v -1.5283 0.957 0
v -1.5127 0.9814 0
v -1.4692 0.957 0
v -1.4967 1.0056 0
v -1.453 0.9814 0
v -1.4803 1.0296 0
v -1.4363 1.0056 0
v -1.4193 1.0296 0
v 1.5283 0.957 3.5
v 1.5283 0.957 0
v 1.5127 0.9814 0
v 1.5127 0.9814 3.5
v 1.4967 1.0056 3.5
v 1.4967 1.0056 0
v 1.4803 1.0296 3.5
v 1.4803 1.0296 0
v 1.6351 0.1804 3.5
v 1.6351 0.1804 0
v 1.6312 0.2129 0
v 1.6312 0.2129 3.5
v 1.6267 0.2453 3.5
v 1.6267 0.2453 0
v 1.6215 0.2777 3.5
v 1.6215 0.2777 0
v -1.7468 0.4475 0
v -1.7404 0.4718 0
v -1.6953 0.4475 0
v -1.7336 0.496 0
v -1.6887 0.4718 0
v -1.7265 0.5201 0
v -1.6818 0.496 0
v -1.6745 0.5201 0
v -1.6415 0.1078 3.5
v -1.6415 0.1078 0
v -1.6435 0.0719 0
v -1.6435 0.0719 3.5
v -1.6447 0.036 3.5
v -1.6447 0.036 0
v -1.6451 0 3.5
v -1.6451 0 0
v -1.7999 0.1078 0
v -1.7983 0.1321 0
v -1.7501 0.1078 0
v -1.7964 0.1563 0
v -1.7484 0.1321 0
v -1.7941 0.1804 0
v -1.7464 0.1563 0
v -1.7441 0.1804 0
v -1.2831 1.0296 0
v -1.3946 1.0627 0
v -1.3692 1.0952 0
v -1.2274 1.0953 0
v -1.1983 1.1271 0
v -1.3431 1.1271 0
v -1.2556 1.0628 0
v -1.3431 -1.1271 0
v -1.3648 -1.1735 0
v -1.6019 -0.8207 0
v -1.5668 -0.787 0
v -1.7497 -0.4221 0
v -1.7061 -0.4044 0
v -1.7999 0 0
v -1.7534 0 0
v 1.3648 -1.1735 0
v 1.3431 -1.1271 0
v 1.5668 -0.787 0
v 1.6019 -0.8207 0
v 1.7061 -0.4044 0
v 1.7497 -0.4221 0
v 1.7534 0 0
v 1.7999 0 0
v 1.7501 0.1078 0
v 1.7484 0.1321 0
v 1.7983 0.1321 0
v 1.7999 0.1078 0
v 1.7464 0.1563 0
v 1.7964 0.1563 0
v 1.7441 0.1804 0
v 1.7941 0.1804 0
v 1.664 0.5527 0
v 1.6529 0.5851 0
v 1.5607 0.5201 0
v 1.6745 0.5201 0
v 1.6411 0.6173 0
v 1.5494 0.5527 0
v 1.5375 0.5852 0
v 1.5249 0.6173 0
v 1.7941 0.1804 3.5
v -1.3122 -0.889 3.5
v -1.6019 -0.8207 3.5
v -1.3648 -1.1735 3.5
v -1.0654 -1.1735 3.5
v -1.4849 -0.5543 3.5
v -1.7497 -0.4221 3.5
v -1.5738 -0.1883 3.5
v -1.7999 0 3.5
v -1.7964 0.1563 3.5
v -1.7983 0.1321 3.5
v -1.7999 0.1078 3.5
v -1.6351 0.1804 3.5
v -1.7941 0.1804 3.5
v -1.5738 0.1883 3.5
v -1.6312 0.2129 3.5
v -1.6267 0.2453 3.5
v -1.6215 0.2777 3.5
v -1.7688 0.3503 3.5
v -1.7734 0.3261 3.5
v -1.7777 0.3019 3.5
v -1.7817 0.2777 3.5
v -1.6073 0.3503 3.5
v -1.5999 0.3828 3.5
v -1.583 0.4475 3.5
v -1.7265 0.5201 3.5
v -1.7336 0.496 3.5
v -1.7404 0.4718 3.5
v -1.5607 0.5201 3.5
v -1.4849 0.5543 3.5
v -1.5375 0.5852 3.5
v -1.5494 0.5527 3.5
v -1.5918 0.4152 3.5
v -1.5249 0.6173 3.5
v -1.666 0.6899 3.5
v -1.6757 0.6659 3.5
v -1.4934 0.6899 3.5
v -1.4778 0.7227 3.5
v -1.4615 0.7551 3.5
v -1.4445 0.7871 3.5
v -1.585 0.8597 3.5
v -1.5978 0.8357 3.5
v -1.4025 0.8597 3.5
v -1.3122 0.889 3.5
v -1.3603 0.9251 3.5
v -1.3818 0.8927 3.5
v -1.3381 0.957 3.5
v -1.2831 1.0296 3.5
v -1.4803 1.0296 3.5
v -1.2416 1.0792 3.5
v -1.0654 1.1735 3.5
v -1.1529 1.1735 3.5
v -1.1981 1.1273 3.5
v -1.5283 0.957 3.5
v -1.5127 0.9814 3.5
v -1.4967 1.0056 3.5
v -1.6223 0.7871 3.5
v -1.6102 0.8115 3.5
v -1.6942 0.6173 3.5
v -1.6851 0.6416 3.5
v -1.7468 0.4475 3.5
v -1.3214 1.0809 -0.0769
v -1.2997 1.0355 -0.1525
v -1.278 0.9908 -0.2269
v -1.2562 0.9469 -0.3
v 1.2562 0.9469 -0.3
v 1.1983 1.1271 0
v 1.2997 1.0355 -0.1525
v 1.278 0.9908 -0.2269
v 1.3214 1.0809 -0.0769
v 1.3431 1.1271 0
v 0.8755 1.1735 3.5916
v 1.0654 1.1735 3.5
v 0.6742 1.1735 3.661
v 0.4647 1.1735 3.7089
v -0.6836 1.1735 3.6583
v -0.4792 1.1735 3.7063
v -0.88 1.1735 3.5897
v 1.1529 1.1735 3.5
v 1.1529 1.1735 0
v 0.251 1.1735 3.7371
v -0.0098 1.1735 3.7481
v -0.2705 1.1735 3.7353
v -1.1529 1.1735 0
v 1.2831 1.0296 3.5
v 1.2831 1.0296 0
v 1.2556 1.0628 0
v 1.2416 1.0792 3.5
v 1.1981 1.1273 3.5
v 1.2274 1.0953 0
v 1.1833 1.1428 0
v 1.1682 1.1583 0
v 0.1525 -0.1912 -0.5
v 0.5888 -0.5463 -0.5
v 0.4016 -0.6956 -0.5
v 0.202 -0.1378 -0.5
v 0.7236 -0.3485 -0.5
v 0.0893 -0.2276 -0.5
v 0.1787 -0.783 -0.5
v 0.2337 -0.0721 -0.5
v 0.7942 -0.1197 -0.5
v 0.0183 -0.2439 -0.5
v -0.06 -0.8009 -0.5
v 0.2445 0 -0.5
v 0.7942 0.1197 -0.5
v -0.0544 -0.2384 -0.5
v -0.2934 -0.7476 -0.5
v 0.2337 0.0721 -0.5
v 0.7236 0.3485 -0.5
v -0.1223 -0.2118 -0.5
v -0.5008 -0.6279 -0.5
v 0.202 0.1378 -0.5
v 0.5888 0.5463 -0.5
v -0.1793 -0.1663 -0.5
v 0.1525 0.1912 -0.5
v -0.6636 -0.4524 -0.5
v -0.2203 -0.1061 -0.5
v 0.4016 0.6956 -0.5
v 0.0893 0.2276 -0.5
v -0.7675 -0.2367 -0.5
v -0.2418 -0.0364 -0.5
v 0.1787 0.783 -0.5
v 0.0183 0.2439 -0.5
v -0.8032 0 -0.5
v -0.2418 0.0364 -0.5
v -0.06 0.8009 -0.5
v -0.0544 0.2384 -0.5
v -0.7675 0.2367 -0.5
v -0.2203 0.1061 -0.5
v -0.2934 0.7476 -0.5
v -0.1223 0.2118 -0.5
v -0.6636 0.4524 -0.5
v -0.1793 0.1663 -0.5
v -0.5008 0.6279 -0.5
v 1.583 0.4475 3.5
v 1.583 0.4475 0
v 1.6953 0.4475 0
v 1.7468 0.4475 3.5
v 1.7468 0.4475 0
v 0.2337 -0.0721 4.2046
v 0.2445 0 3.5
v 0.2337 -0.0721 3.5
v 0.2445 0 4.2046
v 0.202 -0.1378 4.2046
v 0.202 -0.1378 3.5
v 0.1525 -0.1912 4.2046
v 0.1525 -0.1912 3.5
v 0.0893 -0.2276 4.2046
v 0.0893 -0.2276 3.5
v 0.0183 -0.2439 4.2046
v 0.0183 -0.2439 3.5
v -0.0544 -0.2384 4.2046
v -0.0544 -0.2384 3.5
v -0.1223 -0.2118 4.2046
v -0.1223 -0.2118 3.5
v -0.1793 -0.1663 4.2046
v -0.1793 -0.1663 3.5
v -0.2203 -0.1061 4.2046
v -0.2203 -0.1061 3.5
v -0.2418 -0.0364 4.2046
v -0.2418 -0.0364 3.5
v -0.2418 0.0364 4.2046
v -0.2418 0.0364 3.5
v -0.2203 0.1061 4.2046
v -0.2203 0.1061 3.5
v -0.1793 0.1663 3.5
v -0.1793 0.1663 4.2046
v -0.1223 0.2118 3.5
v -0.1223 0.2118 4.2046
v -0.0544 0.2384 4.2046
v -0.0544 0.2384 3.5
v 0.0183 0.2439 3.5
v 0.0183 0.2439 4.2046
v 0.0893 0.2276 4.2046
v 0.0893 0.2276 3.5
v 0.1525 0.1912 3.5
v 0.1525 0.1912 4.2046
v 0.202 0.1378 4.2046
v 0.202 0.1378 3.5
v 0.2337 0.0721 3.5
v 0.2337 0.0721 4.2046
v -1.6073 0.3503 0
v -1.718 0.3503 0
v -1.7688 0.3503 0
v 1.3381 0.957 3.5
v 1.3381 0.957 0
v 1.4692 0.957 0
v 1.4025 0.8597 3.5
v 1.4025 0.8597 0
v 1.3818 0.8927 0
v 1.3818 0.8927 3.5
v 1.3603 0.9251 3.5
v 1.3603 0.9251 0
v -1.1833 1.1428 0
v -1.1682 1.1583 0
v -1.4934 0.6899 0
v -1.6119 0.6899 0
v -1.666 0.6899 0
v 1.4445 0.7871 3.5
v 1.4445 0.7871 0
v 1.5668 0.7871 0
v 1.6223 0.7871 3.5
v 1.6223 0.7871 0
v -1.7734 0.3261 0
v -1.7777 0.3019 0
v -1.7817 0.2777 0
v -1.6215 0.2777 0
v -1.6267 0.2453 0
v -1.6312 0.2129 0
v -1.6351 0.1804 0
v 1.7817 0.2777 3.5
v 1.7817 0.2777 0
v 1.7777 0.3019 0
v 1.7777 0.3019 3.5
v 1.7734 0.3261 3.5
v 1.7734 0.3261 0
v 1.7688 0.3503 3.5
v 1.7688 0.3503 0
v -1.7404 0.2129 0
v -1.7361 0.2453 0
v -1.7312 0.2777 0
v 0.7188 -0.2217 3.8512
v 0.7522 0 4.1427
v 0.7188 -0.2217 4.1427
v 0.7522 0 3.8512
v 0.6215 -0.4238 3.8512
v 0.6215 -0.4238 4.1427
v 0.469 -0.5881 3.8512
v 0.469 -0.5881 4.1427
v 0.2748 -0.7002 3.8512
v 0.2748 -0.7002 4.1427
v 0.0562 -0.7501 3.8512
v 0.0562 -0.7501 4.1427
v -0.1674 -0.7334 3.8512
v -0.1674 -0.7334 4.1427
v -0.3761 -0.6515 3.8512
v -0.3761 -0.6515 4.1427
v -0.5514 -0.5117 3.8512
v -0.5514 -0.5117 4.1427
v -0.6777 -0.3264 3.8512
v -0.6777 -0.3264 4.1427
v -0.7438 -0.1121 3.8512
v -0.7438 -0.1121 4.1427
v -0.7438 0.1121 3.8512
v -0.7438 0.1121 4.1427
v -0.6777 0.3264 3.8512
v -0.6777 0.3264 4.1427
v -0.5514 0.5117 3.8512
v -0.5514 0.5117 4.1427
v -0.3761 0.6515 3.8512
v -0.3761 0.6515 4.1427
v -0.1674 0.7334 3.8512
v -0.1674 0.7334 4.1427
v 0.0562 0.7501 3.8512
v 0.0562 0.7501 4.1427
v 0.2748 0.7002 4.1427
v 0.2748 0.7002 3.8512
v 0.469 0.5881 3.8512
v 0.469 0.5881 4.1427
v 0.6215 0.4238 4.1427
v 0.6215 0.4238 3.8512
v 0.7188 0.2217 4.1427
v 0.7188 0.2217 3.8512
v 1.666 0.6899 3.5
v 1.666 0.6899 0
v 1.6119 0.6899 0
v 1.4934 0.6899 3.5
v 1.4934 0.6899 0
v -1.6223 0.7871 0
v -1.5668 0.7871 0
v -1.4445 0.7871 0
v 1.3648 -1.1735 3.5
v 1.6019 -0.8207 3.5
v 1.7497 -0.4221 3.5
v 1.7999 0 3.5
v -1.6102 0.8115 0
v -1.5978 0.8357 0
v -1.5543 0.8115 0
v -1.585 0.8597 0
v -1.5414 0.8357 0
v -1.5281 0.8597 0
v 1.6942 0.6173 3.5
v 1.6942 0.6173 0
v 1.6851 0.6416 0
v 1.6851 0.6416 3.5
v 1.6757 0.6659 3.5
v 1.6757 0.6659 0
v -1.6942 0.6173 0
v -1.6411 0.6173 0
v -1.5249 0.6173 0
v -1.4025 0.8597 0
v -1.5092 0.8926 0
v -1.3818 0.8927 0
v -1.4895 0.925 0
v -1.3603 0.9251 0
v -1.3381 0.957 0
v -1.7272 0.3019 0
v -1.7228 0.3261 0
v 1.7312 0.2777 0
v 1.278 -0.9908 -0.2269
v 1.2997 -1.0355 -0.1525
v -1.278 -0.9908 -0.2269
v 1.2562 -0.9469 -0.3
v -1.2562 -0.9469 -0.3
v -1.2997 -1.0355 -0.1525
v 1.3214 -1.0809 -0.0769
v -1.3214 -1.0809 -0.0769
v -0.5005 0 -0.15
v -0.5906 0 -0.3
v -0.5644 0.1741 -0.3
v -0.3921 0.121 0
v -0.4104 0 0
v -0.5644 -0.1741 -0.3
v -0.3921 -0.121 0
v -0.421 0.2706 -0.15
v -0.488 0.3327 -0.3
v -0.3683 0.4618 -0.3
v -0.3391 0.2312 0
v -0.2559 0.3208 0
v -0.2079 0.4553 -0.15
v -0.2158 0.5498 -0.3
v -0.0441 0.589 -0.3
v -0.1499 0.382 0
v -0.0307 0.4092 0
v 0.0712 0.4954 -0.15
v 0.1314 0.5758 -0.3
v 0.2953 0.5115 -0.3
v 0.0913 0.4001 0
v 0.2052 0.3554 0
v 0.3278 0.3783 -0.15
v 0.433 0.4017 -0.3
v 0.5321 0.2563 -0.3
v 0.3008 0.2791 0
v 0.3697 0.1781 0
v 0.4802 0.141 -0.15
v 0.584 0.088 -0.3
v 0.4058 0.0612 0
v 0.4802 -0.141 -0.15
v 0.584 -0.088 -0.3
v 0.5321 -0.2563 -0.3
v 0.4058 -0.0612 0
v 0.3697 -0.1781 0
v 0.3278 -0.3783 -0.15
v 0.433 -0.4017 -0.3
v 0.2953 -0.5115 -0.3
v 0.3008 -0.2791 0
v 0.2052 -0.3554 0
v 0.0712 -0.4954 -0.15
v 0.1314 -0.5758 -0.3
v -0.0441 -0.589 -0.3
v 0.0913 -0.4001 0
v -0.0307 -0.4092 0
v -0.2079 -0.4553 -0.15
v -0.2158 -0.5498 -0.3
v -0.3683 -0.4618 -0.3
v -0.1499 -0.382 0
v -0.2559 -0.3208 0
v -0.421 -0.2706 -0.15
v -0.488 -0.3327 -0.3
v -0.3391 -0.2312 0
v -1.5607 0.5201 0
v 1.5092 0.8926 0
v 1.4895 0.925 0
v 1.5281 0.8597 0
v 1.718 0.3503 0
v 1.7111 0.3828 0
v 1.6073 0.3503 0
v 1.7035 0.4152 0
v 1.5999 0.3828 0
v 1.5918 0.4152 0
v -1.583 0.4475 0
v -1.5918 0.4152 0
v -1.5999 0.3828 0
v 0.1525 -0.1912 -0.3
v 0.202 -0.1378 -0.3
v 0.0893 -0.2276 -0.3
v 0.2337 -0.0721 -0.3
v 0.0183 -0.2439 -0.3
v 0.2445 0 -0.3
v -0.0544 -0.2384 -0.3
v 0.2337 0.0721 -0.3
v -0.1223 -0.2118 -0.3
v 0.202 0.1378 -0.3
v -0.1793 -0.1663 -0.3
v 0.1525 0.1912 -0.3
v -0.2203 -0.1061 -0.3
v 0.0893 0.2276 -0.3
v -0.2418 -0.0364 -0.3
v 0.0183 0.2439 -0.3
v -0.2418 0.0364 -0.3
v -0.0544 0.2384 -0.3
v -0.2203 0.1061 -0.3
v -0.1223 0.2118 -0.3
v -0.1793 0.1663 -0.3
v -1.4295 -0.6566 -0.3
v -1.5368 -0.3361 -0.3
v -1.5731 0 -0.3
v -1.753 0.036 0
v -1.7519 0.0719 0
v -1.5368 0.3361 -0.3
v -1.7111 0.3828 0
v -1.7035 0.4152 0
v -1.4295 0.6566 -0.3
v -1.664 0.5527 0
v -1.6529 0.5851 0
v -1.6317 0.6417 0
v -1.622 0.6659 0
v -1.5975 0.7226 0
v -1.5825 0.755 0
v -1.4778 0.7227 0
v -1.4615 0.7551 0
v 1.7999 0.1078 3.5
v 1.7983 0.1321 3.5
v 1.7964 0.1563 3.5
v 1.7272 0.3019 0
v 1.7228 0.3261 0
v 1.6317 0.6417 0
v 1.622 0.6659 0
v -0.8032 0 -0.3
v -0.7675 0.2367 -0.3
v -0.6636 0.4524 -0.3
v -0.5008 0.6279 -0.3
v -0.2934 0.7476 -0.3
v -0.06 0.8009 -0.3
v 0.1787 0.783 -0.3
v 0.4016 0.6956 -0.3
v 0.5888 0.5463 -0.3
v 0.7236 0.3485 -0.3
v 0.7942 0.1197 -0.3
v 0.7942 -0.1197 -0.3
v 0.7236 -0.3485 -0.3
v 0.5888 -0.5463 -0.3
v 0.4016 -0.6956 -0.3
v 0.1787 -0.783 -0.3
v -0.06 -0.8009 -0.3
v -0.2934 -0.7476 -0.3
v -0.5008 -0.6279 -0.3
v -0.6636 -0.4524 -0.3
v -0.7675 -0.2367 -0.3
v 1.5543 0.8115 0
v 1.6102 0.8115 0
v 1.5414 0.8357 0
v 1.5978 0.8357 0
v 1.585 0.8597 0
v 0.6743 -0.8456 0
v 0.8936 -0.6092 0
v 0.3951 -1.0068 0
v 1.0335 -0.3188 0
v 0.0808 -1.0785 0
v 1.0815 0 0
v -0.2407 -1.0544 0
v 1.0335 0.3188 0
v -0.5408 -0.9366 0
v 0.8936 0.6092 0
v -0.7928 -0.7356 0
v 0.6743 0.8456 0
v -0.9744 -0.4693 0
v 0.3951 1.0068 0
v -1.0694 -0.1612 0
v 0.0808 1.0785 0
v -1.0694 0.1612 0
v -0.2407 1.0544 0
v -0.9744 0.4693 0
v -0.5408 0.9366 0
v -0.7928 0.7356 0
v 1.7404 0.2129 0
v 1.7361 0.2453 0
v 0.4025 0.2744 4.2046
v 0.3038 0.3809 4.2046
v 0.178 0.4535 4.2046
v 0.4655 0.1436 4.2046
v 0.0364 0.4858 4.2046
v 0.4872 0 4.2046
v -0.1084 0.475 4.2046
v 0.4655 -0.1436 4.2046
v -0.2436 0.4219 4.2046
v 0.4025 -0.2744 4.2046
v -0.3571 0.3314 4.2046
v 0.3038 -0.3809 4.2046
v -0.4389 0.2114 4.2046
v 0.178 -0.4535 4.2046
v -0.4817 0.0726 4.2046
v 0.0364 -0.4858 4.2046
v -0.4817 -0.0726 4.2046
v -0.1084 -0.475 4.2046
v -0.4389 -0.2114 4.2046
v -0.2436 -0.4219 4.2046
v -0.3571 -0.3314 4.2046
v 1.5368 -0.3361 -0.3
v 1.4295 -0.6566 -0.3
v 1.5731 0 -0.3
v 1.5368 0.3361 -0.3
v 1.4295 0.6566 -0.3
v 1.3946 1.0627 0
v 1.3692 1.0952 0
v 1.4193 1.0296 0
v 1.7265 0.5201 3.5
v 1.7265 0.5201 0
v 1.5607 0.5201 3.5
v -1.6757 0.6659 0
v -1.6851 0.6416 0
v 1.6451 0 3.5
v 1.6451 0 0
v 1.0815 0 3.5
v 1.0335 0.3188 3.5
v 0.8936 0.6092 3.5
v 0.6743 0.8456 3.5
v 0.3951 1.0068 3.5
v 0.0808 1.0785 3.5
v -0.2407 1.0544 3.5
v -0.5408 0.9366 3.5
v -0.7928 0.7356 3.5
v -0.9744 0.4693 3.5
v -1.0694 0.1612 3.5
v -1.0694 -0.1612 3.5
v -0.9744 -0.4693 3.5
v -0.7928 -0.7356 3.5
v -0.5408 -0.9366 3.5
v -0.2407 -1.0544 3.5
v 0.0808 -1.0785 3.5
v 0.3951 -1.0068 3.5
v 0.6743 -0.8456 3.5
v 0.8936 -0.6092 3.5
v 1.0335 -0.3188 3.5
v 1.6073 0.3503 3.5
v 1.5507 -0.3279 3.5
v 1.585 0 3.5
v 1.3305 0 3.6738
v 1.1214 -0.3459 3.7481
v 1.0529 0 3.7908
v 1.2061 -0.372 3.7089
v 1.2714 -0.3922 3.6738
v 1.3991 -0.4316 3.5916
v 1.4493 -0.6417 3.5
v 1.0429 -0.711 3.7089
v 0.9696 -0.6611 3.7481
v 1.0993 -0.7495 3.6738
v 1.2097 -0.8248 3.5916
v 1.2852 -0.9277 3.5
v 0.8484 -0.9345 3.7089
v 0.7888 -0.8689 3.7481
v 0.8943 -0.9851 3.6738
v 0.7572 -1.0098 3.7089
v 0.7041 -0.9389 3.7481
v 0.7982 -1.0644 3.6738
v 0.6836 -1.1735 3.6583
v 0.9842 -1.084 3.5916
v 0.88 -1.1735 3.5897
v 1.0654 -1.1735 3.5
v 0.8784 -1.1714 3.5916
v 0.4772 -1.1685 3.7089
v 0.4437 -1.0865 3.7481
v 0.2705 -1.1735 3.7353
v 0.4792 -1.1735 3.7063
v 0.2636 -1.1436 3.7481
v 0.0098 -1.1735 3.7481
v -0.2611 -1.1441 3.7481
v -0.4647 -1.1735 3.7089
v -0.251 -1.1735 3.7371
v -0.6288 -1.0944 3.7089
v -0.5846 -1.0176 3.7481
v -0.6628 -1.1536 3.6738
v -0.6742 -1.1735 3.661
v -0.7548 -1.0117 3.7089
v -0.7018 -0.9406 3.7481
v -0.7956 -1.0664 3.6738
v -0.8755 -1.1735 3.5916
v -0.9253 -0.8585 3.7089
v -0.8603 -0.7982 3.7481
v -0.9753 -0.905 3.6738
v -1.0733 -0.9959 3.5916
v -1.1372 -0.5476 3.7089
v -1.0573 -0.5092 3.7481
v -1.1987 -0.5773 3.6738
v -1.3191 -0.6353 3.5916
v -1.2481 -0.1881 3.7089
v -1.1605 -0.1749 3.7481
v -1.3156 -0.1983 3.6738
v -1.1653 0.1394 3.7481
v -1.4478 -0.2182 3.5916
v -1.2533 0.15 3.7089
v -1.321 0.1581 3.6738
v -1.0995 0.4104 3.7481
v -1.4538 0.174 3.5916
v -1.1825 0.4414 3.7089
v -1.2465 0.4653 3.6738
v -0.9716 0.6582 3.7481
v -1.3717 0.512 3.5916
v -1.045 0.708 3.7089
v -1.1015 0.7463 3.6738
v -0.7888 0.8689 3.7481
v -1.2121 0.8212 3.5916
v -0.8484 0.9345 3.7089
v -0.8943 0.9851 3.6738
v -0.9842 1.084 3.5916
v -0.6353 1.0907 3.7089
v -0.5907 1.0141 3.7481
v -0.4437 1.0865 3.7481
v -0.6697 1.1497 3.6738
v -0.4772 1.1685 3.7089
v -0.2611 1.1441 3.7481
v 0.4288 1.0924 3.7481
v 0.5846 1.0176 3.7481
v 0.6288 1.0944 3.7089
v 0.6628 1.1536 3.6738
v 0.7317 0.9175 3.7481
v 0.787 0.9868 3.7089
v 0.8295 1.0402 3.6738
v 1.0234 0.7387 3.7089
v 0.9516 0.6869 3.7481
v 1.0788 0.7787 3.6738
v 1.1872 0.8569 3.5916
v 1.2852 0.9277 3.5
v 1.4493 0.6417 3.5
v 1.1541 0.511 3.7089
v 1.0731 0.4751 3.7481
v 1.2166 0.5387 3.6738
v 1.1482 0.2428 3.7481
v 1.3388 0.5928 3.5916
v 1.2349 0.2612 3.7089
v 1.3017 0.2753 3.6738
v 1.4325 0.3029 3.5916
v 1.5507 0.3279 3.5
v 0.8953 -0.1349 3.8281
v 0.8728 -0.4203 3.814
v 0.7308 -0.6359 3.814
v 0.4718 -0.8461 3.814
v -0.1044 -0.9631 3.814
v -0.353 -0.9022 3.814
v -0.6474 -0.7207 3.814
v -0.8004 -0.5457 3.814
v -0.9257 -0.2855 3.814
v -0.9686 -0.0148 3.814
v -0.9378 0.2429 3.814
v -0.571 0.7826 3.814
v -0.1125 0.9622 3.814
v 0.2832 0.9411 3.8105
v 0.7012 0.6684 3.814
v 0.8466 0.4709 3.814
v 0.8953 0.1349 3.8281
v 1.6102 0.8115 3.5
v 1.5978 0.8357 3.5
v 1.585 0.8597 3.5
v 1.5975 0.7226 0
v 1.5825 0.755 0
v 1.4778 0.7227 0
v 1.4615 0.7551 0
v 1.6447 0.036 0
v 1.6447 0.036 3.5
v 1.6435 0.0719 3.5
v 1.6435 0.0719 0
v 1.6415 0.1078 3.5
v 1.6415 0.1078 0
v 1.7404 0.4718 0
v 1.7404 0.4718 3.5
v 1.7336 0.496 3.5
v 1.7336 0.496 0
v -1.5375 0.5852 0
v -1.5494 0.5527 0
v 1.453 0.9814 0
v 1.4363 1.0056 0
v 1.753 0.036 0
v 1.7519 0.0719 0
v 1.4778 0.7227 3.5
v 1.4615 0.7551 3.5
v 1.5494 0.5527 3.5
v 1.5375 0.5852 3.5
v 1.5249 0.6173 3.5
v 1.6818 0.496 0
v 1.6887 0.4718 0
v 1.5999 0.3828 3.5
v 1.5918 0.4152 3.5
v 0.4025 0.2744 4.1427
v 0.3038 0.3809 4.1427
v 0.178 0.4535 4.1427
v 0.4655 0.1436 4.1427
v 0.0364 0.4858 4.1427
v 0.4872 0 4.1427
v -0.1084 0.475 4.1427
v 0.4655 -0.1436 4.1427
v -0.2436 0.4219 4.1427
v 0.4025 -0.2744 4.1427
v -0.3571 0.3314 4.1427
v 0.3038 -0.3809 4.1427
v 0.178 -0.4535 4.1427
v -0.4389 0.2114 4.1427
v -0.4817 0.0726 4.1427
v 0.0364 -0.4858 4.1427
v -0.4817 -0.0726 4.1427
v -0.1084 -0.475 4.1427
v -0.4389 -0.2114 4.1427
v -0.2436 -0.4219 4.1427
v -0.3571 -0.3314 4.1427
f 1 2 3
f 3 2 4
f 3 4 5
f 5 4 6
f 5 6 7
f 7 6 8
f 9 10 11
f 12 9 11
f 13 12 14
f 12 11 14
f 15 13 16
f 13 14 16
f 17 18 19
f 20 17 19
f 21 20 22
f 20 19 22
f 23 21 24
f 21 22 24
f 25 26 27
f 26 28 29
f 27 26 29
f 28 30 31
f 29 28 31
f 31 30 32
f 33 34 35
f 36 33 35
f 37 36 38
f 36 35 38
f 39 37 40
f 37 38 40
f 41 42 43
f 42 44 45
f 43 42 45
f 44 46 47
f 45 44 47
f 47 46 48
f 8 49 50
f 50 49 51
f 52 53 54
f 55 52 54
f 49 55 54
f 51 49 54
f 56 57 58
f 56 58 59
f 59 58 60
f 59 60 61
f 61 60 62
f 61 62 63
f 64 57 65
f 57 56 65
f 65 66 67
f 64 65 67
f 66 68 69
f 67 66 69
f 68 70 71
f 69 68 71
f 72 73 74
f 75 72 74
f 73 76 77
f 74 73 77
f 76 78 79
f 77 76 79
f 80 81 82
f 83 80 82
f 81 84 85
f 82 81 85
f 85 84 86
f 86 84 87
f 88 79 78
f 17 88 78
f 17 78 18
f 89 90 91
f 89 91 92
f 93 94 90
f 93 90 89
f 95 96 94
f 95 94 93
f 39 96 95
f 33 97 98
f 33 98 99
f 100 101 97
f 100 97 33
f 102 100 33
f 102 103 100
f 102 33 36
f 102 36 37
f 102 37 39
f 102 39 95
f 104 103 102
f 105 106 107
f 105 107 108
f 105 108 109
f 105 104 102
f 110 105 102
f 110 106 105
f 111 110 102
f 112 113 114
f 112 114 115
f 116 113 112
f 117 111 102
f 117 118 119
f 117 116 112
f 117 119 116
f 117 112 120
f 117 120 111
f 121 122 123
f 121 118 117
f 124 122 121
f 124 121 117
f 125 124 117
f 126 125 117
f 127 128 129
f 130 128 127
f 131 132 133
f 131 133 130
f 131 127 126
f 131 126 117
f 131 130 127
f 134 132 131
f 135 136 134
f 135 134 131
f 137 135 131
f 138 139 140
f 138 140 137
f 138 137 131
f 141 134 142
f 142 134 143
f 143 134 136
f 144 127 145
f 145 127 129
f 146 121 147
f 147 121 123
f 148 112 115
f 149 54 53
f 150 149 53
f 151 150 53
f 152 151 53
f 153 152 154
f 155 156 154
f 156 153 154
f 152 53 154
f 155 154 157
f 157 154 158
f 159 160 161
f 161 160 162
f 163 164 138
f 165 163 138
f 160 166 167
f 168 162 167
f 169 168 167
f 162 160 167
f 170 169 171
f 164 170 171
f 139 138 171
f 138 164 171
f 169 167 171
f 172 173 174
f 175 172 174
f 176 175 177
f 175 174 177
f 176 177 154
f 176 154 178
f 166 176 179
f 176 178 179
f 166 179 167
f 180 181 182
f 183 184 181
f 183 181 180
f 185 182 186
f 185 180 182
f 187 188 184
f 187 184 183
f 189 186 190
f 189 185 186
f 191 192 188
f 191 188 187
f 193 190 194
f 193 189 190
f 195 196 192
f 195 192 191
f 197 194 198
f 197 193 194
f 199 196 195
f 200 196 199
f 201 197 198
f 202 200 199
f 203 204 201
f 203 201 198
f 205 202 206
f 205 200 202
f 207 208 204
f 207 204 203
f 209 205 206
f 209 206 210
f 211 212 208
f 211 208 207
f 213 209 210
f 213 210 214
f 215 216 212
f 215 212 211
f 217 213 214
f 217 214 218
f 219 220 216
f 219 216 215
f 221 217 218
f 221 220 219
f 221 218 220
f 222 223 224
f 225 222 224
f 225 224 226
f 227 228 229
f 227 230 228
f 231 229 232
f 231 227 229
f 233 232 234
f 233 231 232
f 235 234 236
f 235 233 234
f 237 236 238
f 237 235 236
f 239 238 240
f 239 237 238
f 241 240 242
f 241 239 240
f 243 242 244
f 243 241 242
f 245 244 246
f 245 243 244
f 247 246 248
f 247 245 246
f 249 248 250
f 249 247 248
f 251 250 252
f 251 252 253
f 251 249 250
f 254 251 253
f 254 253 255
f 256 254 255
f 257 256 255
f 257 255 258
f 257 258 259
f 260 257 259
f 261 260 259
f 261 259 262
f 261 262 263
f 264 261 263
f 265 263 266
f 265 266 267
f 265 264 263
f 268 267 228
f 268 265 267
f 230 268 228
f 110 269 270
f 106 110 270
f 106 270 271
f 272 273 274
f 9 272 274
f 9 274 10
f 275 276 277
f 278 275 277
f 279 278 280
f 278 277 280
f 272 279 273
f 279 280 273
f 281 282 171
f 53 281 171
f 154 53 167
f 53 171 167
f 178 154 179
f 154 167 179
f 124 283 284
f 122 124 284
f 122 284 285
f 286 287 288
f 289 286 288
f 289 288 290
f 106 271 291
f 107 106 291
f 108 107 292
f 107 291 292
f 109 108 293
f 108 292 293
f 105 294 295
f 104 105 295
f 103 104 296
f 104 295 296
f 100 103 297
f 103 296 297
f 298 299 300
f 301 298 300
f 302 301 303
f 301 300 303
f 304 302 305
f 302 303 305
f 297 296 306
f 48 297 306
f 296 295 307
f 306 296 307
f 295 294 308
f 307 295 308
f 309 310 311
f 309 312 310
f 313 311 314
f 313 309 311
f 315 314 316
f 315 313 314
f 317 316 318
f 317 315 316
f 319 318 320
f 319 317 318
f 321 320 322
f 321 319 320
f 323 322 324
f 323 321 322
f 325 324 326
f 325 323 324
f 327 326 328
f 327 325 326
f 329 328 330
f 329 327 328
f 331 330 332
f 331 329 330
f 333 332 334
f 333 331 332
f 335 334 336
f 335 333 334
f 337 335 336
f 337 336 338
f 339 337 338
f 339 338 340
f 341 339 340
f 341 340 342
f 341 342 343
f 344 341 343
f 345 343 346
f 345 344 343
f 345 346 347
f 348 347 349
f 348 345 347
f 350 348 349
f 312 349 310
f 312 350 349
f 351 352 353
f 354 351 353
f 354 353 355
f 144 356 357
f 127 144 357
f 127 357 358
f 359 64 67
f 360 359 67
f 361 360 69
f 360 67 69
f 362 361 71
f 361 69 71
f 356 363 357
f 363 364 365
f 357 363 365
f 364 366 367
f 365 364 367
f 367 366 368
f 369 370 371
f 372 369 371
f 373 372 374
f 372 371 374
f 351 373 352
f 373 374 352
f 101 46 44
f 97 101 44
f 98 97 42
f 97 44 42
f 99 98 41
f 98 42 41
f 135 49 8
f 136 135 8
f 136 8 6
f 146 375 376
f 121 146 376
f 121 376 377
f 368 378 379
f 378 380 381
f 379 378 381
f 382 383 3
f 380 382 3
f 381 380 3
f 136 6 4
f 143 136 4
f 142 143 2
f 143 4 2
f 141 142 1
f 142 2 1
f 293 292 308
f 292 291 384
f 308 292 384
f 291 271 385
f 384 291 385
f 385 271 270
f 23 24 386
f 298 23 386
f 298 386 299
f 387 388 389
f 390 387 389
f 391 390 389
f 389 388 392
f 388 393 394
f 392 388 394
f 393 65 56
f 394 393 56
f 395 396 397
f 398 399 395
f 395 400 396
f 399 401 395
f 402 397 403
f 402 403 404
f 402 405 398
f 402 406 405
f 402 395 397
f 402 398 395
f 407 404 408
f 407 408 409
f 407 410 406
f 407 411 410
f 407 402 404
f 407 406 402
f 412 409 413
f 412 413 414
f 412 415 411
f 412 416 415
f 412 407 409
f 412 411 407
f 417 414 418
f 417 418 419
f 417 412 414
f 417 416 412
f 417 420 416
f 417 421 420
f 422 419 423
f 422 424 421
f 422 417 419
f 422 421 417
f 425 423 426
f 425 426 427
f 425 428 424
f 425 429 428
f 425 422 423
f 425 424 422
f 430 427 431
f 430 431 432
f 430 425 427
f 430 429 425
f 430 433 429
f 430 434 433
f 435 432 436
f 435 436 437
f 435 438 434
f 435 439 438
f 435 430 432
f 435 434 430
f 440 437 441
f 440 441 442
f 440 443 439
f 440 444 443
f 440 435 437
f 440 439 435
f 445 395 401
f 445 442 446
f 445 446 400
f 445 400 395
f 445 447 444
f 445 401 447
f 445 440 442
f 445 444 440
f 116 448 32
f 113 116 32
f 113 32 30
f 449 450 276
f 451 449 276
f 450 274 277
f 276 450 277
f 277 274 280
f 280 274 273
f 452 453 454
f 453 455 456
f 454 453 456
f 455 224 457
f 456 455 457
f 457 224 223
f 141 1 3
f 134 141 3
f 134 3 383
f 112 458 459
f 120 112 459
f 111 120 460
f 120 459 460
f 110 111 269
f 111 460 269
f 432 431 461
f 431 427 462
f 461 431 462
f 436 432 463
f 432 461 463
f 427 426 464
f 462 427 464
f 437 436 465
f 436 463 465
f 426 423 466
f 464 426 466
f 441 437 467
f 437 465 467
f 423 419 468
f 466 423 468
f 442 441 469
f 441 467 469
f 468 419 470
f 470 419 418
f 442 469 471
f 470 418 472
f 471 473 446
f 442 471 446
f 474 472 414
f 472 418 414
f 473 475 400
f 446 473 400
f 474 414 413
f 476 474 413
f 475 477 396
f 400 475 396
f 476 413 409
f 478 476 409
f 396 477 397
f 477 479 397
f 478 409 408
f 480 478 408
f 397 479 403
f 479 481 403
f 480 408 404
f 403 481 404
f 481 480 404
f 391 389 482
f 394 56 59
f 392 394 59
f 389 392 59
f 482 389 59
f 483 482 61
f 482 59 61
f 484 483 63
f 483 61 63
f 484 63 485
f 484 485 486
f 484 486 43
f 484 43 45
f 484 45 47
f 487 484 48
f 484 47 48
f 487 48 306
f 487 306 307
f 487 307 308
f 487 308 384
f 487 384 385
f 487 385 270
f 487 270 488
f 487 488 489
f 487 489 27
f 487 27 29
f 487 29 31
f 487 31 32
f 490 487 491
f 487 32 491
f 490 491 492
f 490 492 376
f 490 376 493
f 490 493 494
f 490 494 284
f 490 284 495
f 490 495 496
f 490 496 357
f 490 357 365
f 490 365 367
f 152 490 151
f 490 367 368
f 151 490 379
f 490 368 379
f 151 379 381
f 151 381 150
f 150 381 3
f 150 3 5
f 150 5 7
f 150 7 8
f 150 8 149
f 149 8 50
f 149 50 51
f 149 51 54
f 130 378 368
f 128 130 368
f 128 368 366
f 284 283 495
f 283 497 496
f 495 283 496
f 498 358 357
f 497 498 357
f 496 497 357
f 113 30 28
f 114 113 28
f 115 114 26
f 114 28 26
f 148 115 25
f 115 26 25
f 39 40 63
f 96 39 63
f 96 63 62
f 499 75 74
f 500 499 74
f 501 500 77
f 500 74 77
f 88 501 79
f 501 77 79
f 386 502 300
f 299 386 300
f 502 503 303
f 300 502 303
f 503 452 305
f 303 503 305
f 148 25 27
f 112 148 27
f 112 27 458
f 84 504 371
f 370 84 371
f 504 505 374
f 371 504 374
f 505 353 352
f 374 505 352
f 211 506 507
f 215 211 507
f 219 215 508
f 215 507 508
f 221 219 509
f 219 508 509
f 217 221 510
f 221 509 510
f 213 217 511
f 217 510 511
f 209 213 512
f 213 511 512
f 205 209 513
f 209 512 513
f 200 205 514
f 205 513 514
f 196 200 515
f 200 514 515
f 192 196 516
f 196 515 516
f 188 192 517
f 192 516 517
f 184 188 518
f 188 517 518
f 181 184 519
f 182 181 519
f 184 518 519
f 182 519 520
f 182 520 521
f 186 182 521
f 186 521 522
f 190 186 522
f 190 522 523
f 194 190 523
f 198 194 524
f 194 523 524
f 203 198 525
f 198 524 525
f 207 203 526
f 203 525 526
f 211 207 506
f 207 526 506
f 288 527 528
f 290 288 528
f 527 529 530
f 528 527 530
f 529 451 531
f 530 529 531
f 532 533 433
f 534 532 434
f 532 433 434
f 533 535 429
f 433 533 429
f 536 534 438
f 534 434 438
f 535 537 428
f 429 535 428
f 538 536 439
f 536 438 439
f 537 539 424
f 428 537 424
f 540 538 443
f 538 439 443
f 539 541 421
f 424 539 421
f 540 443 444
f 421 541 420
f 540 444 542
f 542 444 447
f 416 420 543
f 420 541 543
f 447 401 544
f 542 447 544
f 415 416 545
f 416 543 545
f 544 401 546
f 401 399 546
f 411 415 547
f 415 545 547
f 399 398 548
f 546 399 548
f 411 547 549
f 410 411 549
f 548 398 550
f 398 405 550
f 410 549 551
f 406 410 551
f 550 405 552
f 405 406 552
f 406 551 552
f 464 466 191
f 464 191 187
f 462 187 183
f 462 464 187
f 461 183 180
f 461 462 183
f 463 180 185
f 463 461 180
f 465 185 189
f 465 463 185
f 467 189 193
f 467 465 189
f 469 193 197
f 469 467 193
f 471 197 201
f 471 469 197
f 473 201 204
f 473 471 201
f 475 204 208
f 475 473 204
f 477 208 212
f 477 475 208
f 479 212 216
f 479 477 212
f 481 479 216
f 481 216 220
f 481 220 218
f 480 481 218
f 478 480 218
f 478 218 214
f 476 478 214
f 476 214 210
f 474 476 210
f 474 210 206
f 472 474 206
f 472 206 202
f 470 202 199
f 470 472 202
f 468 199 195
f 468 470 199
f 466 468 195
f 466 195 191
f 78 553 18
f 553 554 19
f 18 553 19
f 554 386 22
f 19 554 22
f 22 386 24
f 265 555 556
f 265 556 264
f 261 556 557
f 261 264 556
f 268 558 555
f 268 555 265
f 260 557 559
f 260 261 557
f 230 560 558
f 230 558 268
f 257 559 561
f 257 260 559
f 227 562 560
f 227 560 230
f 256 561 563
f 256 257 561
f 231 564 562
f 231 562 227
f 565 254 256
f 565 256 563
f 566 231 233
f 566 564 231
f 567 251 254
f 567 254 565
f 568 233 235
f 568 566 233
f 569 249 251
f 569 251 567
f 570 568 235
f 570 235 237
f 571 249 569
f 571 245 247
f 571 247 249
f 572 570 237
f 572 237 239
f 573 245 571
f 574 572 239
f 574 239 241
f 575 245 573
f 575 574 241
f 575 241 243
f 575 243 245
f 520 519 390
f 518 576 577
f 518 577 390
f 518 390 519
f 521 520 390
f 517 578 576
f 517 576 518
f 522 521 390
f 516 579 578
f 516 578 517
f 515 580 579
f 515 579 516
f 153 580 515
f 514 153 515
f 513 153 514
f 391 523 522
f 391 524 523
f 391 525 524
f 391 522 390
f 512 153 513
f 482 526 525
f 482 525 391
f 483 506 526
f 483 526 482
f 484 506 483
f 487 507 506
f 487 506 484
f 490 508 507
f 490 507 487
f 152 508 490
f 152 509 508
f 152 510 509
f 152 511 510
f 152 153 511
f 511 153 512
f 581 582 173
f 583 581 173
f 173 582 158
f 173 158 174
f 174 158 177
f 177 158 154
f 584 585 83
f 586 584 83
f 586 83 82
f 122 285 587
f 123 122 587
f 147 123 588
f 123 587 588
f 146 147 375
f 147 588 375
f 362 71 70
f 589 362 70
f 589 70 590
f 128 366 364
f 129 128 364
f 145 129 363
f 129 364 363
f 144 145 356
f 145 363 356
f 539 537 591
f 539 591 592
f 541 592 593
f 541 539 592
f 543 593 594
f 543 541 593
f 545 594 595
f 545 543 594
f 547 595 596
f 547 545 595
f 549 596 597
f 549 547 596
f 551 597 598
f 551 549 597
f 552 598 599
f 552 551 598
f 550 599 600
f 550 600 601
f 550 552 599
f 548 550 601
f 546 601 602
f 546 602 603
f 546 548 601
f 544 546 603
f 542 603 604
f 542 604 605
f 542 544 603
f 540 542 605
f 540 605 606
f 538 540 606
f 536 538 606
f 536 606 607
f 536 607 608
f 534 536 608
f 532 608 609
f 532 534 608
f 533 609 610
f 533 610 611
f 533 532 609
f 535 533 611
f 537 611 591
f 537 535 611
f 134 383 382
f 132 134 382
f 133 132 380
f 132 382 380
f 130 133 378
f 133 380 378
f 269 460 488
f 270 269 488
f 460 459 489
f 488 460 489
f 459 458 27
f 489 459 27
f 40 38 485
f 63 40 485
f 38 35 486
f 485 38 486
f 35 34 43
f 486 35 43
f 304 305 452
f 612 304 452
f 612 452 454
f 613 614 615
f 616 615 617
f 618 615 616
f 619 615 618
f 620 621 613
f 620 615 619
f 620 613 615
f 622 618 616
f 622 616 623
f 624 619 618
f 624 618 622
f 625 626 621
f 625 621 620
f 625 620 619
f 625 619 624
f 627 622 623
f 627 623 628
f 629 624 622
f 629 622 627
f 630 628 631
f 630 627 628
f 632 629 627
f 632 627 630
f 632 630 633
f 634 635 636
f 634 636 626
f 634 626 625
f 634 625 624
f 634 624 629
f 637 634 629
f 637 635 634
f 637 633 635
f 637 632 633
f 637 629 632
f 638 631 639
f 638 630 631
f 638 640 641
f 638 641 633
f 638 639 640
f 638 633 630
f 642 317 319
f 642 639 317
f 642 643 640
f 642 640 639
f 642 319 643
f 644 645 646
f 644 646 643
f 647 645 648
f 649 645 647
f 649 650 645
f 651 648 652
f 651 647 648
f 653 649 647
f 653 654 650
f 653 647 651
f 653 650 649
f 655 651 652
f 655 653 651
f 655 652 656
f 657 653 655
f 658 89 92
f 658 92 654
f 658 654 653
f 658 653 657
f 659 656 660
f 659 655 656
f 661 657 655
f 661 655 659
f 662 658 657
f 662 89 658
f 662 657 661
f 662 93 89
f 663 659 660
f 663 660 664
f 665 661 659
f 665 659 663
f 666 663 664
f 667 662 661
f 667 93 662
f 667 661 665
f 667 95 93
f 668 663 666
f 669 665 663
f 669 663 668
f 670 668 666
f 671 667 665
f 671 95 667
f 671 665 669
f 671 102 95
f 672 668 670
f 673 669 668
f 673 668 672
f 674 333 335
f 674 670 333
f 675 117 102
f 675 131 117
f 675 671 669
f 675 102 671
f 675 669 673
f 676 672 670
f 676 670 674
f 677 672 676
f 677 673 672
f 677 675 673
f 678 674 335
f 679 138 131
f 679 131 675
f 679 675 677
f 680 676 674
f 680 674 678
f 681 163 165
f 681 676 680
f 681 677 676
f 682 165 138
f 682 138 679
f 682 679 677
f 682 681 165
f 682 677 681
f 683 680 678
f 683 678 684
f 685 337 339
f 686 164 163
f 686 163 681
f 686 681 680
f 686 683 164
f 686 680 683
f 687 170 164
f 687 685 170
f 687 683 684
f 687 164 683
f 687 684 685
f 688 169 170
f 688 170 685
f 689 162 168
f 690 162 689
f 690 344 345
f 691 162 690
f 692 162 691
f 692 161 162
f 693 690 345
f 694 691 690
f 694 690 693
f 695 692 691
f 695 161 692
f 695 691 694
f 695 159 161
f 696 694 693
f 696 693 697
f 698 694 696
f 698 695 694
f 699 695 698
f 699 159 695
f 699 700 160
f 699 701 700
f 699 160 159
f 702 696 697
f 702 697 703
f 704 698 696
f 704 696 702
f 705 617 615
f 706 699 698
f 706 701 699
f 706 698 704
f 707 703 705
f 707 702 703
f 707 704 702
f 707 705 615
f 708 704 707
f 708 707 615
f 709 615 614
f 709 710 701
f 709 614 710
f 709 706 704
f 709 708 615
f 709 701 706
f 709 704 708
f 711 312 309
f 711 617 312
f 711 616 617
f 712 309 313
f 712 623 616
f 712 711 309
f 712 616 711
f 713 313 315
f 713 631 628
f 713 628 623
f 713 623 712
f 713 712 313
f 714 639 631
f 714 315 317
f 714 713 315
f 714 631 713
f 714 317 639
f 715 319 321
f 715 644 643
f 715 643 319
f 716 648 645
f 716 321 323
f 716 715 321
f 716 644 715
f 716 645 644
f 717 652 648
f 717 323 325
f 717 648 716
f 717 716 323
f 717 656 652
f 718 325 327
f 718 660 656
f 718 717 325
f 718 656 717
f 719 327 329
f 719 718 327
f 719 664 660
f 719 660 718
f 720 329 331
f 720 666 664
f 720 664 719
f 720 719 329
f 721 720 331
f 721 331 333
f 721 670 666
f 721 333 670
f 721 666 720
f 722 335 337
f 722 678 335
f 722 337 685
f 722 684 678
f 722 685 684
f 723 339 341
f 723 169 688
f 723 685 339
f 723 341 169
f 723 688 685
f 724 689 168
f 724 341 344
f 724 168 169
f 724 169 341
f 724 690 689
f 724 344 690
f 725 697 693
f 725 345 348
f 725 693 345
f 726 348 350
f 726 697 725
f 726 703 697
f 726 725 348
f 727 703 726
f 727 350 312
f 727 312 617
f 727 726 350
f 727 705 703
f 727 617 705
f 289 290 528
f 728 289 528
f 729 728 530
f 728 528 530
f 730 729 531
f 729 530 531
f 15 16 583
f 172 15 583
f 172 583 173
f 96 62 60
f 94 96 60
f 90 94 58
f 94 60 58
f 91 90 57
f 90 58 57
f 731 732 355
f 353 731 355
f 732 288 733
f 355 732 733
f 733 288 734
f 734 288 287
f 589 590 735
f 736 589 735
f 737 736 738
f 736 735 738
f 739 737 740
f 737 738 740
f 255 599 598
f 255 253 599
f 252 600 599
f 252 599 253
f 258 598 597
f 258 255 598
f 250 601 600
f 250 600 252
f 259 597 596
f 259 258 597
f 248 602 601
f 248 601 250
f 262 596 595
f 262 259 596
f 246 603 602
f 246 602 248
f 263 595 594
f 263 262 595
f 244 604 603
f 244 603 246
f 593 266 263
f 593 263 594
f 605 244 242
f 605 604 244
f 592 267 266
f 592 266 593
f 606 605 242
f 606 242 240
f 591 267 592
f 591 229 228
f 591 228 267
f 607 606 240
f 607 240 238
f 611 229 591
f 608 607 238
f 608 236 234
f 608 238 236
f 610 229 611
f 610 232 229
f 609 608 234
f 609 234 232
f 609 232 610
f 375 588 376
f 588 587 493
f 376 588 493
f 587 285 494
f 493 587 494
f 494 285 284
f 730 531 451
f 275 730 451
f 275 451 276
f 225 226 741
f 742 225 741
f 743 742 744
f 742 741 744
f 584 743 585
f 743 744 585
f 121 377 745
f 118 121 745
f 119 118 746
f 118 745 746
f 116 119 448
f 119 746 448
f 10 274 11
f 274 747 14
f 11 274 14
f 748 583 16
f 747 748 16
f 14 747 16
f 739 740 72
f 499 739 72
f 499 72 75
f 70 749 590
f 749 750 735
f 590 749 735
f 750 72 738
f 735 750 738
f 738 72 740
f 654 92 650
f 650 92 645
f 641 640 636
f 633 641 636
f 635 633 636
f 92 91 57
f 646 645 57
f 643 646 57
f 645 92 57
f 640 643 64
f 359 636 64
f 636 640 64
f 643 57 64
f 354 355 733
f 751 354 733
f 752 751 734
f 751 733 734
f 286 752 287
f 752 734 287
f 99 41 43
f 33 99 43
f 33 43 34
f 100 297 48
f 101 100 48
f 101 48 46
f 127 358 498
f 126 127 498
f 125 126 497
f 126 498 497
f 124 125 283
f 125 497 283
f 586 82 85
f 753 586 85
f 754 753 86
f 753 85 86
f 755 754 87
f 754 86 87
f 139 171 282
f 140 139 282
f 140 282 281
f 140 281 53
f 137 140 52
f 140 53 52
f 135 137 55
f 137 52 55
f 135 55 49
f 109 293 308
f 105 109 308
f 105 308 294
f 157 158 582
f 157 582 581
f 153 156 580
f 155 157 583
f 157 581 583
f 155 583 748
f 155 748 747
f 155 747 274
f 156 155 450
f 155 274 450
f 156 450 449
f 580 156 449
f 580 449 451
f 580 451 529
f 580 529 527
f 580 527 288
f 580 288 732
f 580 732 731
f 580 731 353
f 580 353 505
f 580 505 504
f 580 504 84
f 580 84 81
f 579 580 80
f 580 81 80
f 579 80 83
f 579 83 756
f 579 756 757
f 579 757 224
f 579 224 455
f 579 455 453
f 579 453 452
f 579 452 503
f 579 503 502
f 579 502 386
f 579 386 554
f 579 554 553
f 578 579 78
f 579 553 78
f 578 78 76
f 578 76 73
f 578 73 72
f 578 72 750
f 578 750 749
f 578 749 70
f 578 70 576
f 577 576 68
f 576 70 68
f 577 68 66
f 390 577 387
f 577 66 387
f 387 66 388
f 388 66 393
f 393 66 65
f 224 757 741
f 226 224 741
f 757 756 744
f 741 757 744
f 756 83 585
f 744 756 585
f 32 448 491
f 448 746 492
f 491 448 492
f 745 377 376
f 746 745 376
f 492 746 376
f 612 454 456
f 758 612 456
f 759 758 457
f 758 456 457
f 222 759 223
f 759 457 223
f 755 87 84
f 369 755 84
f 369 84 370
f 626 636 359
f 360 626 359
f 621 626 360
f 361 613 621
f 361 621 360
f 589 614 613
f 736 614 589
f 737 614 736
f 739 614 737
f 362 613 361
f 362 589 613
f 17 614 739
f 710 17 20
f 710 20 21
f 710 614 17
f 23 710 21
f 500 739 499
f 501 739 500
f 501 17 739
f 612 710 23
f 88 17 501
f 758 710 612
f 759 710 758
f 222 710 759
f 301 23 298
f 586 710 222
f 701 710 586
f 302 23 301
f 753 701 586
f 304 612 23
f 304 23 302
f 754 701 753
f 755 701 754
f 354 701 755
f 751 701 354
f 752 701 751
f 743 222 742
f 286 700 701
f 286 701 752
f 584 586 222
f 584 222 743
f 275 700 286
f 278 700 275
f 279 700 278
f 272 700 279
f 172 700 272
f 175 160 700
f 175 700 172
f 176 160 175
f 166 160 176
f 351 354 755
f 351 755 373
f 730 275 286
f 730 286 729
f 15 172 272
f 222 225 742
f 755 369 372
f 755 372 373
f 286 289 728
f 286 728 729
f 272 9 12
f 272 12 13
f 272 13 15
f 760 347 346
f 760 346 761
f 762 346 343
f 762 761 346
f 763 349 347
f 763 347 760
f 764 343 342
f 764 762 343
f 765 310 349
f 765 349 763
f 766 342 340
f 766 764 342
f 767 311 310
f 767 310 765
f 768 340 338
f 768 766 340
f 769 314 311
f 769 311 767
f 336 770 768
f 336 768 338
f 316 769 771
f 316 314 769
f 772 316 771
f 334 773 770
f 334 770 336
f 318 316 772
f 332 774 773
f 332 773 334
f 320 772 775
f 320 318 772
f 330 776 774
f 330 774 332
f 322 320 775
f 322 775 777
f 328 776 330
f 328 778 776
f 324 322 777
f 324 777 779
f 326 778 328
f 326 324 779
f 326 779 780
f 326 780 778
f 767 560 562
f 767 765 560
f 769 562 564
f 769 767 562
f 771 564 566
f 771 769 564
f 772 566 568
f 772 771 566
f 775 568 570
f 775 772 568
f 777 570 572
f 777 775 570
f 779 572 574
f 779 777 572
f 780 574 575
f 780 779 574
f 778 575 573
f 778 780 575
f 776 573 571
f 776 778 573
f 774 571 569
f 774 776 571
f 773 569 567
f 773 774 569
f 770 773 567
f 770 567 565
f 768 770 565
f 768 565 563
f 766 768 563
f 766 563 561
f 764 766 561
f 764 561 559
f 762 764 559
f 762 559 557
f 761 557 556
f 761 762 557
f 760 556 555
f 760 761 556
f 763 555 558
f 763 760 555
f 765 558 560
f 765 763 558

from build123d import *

# Parameters (mm, degrees)
ESQUISSE1_R             = 1.081511131
BOSS_EXTRU_1_DEPTH      = 3.5
ESQUISSE3_R             = 0.410372832
BOSS_EXTRU_2_DEPTH      = 0.3
BOSS_EXTRU_2_DRAFT      = 31
ESQUISSE4_W             = 2.396874893
ESQUISSE4_H             = 0.634189101
ESQUISSE4_W_2           = 2.754584076
ESQUISSE4_H_2           = 0.575875801
ENL_V_MAT_EXTRU_1_DEPTH = 10.3
ESQUISSE5_R             = 0.803157719
ESQUISSE5_R_2           = 0.244537362
BOSS_EXTRU_3_DEPTH      = 0.2


with BuildPart() as part:
    # Esquisse1 → Boss.-Extru.1 (new body)
    with BuildSketch(Plane.XY):
        with BuildLine():
            ThreePointArc((1.283053605, 1.029568507), (1.22008068, 1.103467715), (1.152857828, 1.173523196))
            Line((1.152857828, 1.173523196), (-1.152857828, 1.173523196))
            ThreePointArc((-1.152857828, 1.173523196), (-1.22008068, 1.103467715), (-1.283053605, 1.029568507))
            Line((-1.283053605, 1.029568507), (-1.480340364, 1.029568507))
            ThreePointArc((-1.480340364, 1.029568507), (-1.5047525, 0.993548599), (-1.528288379, 0.956950122))
            Line((-1.528288379, 0.956950122), (-1.338089806, 0.956950122))
            ThreePointArc((-1.338089806, 0.956950122), (-1.371169173, 0.908918567), (-1.402525217, 0.859744659))
            Line((-1.402525217, 0.859744659), (-1.585010418, 0.859744659))
            ThreePointArc((-1.585010418, 0.859744659), (-1.604065256, 0.823646502), (-1.622298103, 0.787126273))
            Line((-1.622298103, 0.787126273), (-1.444531098, 0.787126273))
            ThreePointArc((-1.444531098, 0.787126273), (-1.469769972, 0.738927665), (-1.493401198, 0.68992081))
            Line((-1.493401198, 0.68992081), (-1.665961638, 0.68992081))
            ThreePointArc((-1.665961638, 0.68992081), (-1.680479463, 0.653764236), (-1.694212685, 0.617302425))
            Line((-1.694212685, 0.617302425), (-1.524852642, 0.617302425))
            ThreePointArc((-1.524852642, 0.617302425), (-1.543534106, 0.568981833), (-1.56068479, 0.520096962))
            Line((-1.56068479, 0.520096962), (-1.726533537, 0.520096962))
            ThreePointArc((-1.726533537, 0.520096962), (-1.737027918, 0.483893496), (-1.746763243, 0.447478576))
            Line((-1.746763243, 0.447478576), (-1.583035308, 0.447478576))
            ThreePointArc((-1.583035308, 0.447478576), (-1.595928641, 0.399060944), (-1.607341473, 0.350273113))
            Line((-1.607341473, 0.350273113), (-1.768820977, 0.350273113))
            ThreePointArc((-1.768820977, 0.350273113), (-1.775613788, 0.314029584), (-1.781664041, 0.277654728))
            Line((-1.781664041, 0.277654728), (-1.621464066, 0.277654728))
            ThreePointArc((-1.621464066, 0.277654728), (-1.629026183, 0.22915401), (-1.635137892, 0.180449265))
            Line((-1.635137892, 0.180449265), (-1.794117323, 0.180449265))
            ThreePointArc((-1.794117323, 0.180449265), (-1.797396468, 0.144169491), (-1.799942056, 0.107830879))
            Line((-1.799942056, 0.107830879), (-1.64152684, 0.107830879))
            ThreePointArc((-1.64152684, 0.107830879), (-1.644179996, 0.05394445), (-1.645064699, 0))
            Line((-1.645064699, 0), (-1.799942056, 0))
            ThreePointArc((-1.799942056, 0), (-1.687649711, -0.62580337), (-1.364783761, -1.173523196))
            Line((-1.364783761, -1.173523196), (-1.152857828, -1.173523196))
            Line((-1.152857828, -1.173523196), (0, -1.173523196))
            Line((0, -1.173523196), (1.152857828, -1.173523196))
            Line((1.152857828, -1.173523196), (1.364783761, -1.173523196))
            ThreePointArc((1.364783761, -1.173523196), (1.687649711, -0.62580337), (1.799942056, 0))
            Line((1.799942056, 0), (1.645064699, 0))
            ThreePointArc((1.645064699, 0), (1.644179996, 0.05394445), (1.64152684, 0.107830879))
            Line((1.64152684, 0.107830879), (1.799942056, 0.107830879))
            ThreePointArc((1.799942056, 0.107830879), (1.797396468, 0.144169491), (1.794117323, 0.180449265))
            Line((1.794117323, 0.180449265), (1.635137892, 0.180449265))
            ThreePointArc((1.635137892, 0.180449265), (1.629026183, 0.22915401), (1.621464066, 0.277654728))
            Line((1.621464066, 0.277654728), (1.781664041, 0.277654728))
            ThreePointArc((1.781664041, 0.277654728), (1.775613788, 0.314029584), (1.768820977, 0.350273113))
            Line((1.768820977, 0.350273113), (1.607341473, 0.350273113))
            ThreePointArc((1.607341473, 0.350273113), (1.595928641, 0.399060944), (1.583035308, 0.447478576))
            Line((1.583035308, 0.447478576), (1.746763243, 0.447478576))
            ThreePointArc((1.746763243, 0.447478576), (1.737027918, 0.483893496), (1.726533537, 0.520096962))
            Line((1.726533537, 0.520096962), (1.56068479, 0.520096962))
            ThreePointArc((1.56068479, 0.520096962), (1.543534106, 0.568981833), (1.524852642, 0.617302425))
            Line((1.524852642, 0.617302425), (1.694212685, 0.617302425))
            ThreePointArc((1.694212685, 0.617302425), (1.680479463, 0.653764236), (1.665961638, 0.68992081))
            Line((1.665961638, 0.68992081), (1.493401198, 0.68992081))
            ThreePointArc((1.493401198, 0.68992081), (1.469769972, 0.738927665), (1.444531098, 0.787126273))
            Line((1.444531098, 0.787126273), (1.622298103, 0.787126273))
            ThreePointArc((1.622298103, 0.787126273), (1.604065256, 0.823646502), (1.585010418, 0.859744659))
            Line((1.585010418, 0.859744659), (1.402525217, 0.859744659))
            ThreePointArc((1.402525217, 0.859744659), (1.371169173, 0.908918567), (1.338089806, 0.956950122))
            Line((1.338089806, 0.956950122), (1.528288379, 0.956950122))
            ThreePointArc((1.528288379, 0.956950122), (1.5047525, 0.993548599), (1.480340364, 1.029568507))
            Line((1.480340364, 1.029568507), (1.283053605, 1.029568507))
        make_face()
        Circle(ESQUISSE1_R, mode=Mode.SUBTRACT)
    extrude(amount=BOSS_EXTRU_1_DEPTH)

    # Esquisse2 → Révolution1 (revolve)
    with BuildSketch(Plane(origin=(0, 0, 0), x_dir=(1, 0, 0), z_dir=(0, 1, 0))):
        with BuildLine():
            Line((1.585010418, -3.5), (0.244537362, -3.5))
            Line((0.244537362, -3.5), (0.244537362, -4.204593095))
            Line((0.244537362, -4.204593095), (0.487185346, -4.204593095))
            Line((0.487185346, -4.204593095), (0.487185346, -4.142746313))
            Line((0.487185346, -4.142746313), (0.752242982, -4.142746313))
            Line((0.752242982, -4.142746313), (0.752242982, -3.851182914))
            add(Edge.make_bspline(
                [(0.752242982, -3.851182914), (1.220495176, -3.803222811), (1.585010418, -3.5)],
                knots=[0, 0, 0, 1, 1, 1], degree=2))
        make_face()
    revolve(axis=Axis((0, 0, 3.5), (0, 0, -1)))


with BuildPart() as boss_extru_2_tool:
    # Esquisse3 → Boss.-Extru.2 (with draft: the straight prism first)
    with BuildSketch(Plane(origin=(0, 0, 0), x_dir=(-1, 0, 0), z_dir=(0, 0, -1))):
        with BuildLine():
            ThreePointArc((-1.343095681, 1.127120496), (-1.753370075, 0), (-1.343095681, -1.127120496))
            Line((-1.343095681, -1.127120496), (1.343095681, -1.127120496))
            ThreePointArc((1.343095681, -1.127120496), (1.753370075, 0), (1.343095681, 1.127120496))
            Line((1.343095681, 1.127120496), (-1.343095681, 1.127120496))
        make_face()
        Circle(ESQUISSE3_R, mode=Mode.SUBTRACT)
    extrude(amount=BOSS_EXTRU_2_DEPTH)
    # Boss.-Extru.2: the draft: its side faces are tilted about the plane it starts from
    boss_extru_2_sides = [boss_extru_2_tool.faces().sort_by_distance(p)[0] for p in [
        (1.753370075, 0, -0.15),
        (0, -1.127120496, -0.15),
        (-1.753370075, 0, -0.15),
        (0, 1.127120496, -0.15),
        (0.410372832, 0, -0.15),
    ]]
    draft(boss_extru_2_sides, Plane(origin=(0, 0, 0), x_dir=(-1, 0, 0), z_dir=(0, 0, -1)), BOSS_EXTRU_2_DRAFT)


with BuildPart() as part_1:
    add(part.part)

    # Boss.-Extru.2: add boss_extru_2_tool
    add(boss_extru_2_tool.part)

    # Esquisse4 → Enlèv. mat.-Extru.1 (cut)
    with BuildSketch(Plane(origin=(0, 0, -0.3), x_dir=(-1, 0, 0), z_dir=(0, 0, -1))):
        with Locations((0.045579618, 1.490617747)):
            Rectangle(ESQUISSE4_W, ESQUISSE4_H)
        with Locations((0.012508277, -1.461461097)):
            Rectangle(ESQUISSE4_W_2, ESQUISSE4_H_2)
    extrude(amount=-ENL_V_MAT_EXTRU_1_DEPTH, mode=Mode.SUBTRACT)

    # Esquisse5 → Boss.-Extru.3 (add)
    with BuildSketch(Plane(origin=(0, 0, -0.3), x_dir=(-1, 0, 0), z_dir=(0, 0, -1))):
        Circle(ESQUISSE5_R)
        with Locations(Location((0, 0, 0), (0, 0, 180))):
            Circle(ESQUISSE5_R_2, mode=Mode.SUBTRACT)
    extrude(amount=BOSS_EXTRU_3_DEPTH)


solid = part_1.part
